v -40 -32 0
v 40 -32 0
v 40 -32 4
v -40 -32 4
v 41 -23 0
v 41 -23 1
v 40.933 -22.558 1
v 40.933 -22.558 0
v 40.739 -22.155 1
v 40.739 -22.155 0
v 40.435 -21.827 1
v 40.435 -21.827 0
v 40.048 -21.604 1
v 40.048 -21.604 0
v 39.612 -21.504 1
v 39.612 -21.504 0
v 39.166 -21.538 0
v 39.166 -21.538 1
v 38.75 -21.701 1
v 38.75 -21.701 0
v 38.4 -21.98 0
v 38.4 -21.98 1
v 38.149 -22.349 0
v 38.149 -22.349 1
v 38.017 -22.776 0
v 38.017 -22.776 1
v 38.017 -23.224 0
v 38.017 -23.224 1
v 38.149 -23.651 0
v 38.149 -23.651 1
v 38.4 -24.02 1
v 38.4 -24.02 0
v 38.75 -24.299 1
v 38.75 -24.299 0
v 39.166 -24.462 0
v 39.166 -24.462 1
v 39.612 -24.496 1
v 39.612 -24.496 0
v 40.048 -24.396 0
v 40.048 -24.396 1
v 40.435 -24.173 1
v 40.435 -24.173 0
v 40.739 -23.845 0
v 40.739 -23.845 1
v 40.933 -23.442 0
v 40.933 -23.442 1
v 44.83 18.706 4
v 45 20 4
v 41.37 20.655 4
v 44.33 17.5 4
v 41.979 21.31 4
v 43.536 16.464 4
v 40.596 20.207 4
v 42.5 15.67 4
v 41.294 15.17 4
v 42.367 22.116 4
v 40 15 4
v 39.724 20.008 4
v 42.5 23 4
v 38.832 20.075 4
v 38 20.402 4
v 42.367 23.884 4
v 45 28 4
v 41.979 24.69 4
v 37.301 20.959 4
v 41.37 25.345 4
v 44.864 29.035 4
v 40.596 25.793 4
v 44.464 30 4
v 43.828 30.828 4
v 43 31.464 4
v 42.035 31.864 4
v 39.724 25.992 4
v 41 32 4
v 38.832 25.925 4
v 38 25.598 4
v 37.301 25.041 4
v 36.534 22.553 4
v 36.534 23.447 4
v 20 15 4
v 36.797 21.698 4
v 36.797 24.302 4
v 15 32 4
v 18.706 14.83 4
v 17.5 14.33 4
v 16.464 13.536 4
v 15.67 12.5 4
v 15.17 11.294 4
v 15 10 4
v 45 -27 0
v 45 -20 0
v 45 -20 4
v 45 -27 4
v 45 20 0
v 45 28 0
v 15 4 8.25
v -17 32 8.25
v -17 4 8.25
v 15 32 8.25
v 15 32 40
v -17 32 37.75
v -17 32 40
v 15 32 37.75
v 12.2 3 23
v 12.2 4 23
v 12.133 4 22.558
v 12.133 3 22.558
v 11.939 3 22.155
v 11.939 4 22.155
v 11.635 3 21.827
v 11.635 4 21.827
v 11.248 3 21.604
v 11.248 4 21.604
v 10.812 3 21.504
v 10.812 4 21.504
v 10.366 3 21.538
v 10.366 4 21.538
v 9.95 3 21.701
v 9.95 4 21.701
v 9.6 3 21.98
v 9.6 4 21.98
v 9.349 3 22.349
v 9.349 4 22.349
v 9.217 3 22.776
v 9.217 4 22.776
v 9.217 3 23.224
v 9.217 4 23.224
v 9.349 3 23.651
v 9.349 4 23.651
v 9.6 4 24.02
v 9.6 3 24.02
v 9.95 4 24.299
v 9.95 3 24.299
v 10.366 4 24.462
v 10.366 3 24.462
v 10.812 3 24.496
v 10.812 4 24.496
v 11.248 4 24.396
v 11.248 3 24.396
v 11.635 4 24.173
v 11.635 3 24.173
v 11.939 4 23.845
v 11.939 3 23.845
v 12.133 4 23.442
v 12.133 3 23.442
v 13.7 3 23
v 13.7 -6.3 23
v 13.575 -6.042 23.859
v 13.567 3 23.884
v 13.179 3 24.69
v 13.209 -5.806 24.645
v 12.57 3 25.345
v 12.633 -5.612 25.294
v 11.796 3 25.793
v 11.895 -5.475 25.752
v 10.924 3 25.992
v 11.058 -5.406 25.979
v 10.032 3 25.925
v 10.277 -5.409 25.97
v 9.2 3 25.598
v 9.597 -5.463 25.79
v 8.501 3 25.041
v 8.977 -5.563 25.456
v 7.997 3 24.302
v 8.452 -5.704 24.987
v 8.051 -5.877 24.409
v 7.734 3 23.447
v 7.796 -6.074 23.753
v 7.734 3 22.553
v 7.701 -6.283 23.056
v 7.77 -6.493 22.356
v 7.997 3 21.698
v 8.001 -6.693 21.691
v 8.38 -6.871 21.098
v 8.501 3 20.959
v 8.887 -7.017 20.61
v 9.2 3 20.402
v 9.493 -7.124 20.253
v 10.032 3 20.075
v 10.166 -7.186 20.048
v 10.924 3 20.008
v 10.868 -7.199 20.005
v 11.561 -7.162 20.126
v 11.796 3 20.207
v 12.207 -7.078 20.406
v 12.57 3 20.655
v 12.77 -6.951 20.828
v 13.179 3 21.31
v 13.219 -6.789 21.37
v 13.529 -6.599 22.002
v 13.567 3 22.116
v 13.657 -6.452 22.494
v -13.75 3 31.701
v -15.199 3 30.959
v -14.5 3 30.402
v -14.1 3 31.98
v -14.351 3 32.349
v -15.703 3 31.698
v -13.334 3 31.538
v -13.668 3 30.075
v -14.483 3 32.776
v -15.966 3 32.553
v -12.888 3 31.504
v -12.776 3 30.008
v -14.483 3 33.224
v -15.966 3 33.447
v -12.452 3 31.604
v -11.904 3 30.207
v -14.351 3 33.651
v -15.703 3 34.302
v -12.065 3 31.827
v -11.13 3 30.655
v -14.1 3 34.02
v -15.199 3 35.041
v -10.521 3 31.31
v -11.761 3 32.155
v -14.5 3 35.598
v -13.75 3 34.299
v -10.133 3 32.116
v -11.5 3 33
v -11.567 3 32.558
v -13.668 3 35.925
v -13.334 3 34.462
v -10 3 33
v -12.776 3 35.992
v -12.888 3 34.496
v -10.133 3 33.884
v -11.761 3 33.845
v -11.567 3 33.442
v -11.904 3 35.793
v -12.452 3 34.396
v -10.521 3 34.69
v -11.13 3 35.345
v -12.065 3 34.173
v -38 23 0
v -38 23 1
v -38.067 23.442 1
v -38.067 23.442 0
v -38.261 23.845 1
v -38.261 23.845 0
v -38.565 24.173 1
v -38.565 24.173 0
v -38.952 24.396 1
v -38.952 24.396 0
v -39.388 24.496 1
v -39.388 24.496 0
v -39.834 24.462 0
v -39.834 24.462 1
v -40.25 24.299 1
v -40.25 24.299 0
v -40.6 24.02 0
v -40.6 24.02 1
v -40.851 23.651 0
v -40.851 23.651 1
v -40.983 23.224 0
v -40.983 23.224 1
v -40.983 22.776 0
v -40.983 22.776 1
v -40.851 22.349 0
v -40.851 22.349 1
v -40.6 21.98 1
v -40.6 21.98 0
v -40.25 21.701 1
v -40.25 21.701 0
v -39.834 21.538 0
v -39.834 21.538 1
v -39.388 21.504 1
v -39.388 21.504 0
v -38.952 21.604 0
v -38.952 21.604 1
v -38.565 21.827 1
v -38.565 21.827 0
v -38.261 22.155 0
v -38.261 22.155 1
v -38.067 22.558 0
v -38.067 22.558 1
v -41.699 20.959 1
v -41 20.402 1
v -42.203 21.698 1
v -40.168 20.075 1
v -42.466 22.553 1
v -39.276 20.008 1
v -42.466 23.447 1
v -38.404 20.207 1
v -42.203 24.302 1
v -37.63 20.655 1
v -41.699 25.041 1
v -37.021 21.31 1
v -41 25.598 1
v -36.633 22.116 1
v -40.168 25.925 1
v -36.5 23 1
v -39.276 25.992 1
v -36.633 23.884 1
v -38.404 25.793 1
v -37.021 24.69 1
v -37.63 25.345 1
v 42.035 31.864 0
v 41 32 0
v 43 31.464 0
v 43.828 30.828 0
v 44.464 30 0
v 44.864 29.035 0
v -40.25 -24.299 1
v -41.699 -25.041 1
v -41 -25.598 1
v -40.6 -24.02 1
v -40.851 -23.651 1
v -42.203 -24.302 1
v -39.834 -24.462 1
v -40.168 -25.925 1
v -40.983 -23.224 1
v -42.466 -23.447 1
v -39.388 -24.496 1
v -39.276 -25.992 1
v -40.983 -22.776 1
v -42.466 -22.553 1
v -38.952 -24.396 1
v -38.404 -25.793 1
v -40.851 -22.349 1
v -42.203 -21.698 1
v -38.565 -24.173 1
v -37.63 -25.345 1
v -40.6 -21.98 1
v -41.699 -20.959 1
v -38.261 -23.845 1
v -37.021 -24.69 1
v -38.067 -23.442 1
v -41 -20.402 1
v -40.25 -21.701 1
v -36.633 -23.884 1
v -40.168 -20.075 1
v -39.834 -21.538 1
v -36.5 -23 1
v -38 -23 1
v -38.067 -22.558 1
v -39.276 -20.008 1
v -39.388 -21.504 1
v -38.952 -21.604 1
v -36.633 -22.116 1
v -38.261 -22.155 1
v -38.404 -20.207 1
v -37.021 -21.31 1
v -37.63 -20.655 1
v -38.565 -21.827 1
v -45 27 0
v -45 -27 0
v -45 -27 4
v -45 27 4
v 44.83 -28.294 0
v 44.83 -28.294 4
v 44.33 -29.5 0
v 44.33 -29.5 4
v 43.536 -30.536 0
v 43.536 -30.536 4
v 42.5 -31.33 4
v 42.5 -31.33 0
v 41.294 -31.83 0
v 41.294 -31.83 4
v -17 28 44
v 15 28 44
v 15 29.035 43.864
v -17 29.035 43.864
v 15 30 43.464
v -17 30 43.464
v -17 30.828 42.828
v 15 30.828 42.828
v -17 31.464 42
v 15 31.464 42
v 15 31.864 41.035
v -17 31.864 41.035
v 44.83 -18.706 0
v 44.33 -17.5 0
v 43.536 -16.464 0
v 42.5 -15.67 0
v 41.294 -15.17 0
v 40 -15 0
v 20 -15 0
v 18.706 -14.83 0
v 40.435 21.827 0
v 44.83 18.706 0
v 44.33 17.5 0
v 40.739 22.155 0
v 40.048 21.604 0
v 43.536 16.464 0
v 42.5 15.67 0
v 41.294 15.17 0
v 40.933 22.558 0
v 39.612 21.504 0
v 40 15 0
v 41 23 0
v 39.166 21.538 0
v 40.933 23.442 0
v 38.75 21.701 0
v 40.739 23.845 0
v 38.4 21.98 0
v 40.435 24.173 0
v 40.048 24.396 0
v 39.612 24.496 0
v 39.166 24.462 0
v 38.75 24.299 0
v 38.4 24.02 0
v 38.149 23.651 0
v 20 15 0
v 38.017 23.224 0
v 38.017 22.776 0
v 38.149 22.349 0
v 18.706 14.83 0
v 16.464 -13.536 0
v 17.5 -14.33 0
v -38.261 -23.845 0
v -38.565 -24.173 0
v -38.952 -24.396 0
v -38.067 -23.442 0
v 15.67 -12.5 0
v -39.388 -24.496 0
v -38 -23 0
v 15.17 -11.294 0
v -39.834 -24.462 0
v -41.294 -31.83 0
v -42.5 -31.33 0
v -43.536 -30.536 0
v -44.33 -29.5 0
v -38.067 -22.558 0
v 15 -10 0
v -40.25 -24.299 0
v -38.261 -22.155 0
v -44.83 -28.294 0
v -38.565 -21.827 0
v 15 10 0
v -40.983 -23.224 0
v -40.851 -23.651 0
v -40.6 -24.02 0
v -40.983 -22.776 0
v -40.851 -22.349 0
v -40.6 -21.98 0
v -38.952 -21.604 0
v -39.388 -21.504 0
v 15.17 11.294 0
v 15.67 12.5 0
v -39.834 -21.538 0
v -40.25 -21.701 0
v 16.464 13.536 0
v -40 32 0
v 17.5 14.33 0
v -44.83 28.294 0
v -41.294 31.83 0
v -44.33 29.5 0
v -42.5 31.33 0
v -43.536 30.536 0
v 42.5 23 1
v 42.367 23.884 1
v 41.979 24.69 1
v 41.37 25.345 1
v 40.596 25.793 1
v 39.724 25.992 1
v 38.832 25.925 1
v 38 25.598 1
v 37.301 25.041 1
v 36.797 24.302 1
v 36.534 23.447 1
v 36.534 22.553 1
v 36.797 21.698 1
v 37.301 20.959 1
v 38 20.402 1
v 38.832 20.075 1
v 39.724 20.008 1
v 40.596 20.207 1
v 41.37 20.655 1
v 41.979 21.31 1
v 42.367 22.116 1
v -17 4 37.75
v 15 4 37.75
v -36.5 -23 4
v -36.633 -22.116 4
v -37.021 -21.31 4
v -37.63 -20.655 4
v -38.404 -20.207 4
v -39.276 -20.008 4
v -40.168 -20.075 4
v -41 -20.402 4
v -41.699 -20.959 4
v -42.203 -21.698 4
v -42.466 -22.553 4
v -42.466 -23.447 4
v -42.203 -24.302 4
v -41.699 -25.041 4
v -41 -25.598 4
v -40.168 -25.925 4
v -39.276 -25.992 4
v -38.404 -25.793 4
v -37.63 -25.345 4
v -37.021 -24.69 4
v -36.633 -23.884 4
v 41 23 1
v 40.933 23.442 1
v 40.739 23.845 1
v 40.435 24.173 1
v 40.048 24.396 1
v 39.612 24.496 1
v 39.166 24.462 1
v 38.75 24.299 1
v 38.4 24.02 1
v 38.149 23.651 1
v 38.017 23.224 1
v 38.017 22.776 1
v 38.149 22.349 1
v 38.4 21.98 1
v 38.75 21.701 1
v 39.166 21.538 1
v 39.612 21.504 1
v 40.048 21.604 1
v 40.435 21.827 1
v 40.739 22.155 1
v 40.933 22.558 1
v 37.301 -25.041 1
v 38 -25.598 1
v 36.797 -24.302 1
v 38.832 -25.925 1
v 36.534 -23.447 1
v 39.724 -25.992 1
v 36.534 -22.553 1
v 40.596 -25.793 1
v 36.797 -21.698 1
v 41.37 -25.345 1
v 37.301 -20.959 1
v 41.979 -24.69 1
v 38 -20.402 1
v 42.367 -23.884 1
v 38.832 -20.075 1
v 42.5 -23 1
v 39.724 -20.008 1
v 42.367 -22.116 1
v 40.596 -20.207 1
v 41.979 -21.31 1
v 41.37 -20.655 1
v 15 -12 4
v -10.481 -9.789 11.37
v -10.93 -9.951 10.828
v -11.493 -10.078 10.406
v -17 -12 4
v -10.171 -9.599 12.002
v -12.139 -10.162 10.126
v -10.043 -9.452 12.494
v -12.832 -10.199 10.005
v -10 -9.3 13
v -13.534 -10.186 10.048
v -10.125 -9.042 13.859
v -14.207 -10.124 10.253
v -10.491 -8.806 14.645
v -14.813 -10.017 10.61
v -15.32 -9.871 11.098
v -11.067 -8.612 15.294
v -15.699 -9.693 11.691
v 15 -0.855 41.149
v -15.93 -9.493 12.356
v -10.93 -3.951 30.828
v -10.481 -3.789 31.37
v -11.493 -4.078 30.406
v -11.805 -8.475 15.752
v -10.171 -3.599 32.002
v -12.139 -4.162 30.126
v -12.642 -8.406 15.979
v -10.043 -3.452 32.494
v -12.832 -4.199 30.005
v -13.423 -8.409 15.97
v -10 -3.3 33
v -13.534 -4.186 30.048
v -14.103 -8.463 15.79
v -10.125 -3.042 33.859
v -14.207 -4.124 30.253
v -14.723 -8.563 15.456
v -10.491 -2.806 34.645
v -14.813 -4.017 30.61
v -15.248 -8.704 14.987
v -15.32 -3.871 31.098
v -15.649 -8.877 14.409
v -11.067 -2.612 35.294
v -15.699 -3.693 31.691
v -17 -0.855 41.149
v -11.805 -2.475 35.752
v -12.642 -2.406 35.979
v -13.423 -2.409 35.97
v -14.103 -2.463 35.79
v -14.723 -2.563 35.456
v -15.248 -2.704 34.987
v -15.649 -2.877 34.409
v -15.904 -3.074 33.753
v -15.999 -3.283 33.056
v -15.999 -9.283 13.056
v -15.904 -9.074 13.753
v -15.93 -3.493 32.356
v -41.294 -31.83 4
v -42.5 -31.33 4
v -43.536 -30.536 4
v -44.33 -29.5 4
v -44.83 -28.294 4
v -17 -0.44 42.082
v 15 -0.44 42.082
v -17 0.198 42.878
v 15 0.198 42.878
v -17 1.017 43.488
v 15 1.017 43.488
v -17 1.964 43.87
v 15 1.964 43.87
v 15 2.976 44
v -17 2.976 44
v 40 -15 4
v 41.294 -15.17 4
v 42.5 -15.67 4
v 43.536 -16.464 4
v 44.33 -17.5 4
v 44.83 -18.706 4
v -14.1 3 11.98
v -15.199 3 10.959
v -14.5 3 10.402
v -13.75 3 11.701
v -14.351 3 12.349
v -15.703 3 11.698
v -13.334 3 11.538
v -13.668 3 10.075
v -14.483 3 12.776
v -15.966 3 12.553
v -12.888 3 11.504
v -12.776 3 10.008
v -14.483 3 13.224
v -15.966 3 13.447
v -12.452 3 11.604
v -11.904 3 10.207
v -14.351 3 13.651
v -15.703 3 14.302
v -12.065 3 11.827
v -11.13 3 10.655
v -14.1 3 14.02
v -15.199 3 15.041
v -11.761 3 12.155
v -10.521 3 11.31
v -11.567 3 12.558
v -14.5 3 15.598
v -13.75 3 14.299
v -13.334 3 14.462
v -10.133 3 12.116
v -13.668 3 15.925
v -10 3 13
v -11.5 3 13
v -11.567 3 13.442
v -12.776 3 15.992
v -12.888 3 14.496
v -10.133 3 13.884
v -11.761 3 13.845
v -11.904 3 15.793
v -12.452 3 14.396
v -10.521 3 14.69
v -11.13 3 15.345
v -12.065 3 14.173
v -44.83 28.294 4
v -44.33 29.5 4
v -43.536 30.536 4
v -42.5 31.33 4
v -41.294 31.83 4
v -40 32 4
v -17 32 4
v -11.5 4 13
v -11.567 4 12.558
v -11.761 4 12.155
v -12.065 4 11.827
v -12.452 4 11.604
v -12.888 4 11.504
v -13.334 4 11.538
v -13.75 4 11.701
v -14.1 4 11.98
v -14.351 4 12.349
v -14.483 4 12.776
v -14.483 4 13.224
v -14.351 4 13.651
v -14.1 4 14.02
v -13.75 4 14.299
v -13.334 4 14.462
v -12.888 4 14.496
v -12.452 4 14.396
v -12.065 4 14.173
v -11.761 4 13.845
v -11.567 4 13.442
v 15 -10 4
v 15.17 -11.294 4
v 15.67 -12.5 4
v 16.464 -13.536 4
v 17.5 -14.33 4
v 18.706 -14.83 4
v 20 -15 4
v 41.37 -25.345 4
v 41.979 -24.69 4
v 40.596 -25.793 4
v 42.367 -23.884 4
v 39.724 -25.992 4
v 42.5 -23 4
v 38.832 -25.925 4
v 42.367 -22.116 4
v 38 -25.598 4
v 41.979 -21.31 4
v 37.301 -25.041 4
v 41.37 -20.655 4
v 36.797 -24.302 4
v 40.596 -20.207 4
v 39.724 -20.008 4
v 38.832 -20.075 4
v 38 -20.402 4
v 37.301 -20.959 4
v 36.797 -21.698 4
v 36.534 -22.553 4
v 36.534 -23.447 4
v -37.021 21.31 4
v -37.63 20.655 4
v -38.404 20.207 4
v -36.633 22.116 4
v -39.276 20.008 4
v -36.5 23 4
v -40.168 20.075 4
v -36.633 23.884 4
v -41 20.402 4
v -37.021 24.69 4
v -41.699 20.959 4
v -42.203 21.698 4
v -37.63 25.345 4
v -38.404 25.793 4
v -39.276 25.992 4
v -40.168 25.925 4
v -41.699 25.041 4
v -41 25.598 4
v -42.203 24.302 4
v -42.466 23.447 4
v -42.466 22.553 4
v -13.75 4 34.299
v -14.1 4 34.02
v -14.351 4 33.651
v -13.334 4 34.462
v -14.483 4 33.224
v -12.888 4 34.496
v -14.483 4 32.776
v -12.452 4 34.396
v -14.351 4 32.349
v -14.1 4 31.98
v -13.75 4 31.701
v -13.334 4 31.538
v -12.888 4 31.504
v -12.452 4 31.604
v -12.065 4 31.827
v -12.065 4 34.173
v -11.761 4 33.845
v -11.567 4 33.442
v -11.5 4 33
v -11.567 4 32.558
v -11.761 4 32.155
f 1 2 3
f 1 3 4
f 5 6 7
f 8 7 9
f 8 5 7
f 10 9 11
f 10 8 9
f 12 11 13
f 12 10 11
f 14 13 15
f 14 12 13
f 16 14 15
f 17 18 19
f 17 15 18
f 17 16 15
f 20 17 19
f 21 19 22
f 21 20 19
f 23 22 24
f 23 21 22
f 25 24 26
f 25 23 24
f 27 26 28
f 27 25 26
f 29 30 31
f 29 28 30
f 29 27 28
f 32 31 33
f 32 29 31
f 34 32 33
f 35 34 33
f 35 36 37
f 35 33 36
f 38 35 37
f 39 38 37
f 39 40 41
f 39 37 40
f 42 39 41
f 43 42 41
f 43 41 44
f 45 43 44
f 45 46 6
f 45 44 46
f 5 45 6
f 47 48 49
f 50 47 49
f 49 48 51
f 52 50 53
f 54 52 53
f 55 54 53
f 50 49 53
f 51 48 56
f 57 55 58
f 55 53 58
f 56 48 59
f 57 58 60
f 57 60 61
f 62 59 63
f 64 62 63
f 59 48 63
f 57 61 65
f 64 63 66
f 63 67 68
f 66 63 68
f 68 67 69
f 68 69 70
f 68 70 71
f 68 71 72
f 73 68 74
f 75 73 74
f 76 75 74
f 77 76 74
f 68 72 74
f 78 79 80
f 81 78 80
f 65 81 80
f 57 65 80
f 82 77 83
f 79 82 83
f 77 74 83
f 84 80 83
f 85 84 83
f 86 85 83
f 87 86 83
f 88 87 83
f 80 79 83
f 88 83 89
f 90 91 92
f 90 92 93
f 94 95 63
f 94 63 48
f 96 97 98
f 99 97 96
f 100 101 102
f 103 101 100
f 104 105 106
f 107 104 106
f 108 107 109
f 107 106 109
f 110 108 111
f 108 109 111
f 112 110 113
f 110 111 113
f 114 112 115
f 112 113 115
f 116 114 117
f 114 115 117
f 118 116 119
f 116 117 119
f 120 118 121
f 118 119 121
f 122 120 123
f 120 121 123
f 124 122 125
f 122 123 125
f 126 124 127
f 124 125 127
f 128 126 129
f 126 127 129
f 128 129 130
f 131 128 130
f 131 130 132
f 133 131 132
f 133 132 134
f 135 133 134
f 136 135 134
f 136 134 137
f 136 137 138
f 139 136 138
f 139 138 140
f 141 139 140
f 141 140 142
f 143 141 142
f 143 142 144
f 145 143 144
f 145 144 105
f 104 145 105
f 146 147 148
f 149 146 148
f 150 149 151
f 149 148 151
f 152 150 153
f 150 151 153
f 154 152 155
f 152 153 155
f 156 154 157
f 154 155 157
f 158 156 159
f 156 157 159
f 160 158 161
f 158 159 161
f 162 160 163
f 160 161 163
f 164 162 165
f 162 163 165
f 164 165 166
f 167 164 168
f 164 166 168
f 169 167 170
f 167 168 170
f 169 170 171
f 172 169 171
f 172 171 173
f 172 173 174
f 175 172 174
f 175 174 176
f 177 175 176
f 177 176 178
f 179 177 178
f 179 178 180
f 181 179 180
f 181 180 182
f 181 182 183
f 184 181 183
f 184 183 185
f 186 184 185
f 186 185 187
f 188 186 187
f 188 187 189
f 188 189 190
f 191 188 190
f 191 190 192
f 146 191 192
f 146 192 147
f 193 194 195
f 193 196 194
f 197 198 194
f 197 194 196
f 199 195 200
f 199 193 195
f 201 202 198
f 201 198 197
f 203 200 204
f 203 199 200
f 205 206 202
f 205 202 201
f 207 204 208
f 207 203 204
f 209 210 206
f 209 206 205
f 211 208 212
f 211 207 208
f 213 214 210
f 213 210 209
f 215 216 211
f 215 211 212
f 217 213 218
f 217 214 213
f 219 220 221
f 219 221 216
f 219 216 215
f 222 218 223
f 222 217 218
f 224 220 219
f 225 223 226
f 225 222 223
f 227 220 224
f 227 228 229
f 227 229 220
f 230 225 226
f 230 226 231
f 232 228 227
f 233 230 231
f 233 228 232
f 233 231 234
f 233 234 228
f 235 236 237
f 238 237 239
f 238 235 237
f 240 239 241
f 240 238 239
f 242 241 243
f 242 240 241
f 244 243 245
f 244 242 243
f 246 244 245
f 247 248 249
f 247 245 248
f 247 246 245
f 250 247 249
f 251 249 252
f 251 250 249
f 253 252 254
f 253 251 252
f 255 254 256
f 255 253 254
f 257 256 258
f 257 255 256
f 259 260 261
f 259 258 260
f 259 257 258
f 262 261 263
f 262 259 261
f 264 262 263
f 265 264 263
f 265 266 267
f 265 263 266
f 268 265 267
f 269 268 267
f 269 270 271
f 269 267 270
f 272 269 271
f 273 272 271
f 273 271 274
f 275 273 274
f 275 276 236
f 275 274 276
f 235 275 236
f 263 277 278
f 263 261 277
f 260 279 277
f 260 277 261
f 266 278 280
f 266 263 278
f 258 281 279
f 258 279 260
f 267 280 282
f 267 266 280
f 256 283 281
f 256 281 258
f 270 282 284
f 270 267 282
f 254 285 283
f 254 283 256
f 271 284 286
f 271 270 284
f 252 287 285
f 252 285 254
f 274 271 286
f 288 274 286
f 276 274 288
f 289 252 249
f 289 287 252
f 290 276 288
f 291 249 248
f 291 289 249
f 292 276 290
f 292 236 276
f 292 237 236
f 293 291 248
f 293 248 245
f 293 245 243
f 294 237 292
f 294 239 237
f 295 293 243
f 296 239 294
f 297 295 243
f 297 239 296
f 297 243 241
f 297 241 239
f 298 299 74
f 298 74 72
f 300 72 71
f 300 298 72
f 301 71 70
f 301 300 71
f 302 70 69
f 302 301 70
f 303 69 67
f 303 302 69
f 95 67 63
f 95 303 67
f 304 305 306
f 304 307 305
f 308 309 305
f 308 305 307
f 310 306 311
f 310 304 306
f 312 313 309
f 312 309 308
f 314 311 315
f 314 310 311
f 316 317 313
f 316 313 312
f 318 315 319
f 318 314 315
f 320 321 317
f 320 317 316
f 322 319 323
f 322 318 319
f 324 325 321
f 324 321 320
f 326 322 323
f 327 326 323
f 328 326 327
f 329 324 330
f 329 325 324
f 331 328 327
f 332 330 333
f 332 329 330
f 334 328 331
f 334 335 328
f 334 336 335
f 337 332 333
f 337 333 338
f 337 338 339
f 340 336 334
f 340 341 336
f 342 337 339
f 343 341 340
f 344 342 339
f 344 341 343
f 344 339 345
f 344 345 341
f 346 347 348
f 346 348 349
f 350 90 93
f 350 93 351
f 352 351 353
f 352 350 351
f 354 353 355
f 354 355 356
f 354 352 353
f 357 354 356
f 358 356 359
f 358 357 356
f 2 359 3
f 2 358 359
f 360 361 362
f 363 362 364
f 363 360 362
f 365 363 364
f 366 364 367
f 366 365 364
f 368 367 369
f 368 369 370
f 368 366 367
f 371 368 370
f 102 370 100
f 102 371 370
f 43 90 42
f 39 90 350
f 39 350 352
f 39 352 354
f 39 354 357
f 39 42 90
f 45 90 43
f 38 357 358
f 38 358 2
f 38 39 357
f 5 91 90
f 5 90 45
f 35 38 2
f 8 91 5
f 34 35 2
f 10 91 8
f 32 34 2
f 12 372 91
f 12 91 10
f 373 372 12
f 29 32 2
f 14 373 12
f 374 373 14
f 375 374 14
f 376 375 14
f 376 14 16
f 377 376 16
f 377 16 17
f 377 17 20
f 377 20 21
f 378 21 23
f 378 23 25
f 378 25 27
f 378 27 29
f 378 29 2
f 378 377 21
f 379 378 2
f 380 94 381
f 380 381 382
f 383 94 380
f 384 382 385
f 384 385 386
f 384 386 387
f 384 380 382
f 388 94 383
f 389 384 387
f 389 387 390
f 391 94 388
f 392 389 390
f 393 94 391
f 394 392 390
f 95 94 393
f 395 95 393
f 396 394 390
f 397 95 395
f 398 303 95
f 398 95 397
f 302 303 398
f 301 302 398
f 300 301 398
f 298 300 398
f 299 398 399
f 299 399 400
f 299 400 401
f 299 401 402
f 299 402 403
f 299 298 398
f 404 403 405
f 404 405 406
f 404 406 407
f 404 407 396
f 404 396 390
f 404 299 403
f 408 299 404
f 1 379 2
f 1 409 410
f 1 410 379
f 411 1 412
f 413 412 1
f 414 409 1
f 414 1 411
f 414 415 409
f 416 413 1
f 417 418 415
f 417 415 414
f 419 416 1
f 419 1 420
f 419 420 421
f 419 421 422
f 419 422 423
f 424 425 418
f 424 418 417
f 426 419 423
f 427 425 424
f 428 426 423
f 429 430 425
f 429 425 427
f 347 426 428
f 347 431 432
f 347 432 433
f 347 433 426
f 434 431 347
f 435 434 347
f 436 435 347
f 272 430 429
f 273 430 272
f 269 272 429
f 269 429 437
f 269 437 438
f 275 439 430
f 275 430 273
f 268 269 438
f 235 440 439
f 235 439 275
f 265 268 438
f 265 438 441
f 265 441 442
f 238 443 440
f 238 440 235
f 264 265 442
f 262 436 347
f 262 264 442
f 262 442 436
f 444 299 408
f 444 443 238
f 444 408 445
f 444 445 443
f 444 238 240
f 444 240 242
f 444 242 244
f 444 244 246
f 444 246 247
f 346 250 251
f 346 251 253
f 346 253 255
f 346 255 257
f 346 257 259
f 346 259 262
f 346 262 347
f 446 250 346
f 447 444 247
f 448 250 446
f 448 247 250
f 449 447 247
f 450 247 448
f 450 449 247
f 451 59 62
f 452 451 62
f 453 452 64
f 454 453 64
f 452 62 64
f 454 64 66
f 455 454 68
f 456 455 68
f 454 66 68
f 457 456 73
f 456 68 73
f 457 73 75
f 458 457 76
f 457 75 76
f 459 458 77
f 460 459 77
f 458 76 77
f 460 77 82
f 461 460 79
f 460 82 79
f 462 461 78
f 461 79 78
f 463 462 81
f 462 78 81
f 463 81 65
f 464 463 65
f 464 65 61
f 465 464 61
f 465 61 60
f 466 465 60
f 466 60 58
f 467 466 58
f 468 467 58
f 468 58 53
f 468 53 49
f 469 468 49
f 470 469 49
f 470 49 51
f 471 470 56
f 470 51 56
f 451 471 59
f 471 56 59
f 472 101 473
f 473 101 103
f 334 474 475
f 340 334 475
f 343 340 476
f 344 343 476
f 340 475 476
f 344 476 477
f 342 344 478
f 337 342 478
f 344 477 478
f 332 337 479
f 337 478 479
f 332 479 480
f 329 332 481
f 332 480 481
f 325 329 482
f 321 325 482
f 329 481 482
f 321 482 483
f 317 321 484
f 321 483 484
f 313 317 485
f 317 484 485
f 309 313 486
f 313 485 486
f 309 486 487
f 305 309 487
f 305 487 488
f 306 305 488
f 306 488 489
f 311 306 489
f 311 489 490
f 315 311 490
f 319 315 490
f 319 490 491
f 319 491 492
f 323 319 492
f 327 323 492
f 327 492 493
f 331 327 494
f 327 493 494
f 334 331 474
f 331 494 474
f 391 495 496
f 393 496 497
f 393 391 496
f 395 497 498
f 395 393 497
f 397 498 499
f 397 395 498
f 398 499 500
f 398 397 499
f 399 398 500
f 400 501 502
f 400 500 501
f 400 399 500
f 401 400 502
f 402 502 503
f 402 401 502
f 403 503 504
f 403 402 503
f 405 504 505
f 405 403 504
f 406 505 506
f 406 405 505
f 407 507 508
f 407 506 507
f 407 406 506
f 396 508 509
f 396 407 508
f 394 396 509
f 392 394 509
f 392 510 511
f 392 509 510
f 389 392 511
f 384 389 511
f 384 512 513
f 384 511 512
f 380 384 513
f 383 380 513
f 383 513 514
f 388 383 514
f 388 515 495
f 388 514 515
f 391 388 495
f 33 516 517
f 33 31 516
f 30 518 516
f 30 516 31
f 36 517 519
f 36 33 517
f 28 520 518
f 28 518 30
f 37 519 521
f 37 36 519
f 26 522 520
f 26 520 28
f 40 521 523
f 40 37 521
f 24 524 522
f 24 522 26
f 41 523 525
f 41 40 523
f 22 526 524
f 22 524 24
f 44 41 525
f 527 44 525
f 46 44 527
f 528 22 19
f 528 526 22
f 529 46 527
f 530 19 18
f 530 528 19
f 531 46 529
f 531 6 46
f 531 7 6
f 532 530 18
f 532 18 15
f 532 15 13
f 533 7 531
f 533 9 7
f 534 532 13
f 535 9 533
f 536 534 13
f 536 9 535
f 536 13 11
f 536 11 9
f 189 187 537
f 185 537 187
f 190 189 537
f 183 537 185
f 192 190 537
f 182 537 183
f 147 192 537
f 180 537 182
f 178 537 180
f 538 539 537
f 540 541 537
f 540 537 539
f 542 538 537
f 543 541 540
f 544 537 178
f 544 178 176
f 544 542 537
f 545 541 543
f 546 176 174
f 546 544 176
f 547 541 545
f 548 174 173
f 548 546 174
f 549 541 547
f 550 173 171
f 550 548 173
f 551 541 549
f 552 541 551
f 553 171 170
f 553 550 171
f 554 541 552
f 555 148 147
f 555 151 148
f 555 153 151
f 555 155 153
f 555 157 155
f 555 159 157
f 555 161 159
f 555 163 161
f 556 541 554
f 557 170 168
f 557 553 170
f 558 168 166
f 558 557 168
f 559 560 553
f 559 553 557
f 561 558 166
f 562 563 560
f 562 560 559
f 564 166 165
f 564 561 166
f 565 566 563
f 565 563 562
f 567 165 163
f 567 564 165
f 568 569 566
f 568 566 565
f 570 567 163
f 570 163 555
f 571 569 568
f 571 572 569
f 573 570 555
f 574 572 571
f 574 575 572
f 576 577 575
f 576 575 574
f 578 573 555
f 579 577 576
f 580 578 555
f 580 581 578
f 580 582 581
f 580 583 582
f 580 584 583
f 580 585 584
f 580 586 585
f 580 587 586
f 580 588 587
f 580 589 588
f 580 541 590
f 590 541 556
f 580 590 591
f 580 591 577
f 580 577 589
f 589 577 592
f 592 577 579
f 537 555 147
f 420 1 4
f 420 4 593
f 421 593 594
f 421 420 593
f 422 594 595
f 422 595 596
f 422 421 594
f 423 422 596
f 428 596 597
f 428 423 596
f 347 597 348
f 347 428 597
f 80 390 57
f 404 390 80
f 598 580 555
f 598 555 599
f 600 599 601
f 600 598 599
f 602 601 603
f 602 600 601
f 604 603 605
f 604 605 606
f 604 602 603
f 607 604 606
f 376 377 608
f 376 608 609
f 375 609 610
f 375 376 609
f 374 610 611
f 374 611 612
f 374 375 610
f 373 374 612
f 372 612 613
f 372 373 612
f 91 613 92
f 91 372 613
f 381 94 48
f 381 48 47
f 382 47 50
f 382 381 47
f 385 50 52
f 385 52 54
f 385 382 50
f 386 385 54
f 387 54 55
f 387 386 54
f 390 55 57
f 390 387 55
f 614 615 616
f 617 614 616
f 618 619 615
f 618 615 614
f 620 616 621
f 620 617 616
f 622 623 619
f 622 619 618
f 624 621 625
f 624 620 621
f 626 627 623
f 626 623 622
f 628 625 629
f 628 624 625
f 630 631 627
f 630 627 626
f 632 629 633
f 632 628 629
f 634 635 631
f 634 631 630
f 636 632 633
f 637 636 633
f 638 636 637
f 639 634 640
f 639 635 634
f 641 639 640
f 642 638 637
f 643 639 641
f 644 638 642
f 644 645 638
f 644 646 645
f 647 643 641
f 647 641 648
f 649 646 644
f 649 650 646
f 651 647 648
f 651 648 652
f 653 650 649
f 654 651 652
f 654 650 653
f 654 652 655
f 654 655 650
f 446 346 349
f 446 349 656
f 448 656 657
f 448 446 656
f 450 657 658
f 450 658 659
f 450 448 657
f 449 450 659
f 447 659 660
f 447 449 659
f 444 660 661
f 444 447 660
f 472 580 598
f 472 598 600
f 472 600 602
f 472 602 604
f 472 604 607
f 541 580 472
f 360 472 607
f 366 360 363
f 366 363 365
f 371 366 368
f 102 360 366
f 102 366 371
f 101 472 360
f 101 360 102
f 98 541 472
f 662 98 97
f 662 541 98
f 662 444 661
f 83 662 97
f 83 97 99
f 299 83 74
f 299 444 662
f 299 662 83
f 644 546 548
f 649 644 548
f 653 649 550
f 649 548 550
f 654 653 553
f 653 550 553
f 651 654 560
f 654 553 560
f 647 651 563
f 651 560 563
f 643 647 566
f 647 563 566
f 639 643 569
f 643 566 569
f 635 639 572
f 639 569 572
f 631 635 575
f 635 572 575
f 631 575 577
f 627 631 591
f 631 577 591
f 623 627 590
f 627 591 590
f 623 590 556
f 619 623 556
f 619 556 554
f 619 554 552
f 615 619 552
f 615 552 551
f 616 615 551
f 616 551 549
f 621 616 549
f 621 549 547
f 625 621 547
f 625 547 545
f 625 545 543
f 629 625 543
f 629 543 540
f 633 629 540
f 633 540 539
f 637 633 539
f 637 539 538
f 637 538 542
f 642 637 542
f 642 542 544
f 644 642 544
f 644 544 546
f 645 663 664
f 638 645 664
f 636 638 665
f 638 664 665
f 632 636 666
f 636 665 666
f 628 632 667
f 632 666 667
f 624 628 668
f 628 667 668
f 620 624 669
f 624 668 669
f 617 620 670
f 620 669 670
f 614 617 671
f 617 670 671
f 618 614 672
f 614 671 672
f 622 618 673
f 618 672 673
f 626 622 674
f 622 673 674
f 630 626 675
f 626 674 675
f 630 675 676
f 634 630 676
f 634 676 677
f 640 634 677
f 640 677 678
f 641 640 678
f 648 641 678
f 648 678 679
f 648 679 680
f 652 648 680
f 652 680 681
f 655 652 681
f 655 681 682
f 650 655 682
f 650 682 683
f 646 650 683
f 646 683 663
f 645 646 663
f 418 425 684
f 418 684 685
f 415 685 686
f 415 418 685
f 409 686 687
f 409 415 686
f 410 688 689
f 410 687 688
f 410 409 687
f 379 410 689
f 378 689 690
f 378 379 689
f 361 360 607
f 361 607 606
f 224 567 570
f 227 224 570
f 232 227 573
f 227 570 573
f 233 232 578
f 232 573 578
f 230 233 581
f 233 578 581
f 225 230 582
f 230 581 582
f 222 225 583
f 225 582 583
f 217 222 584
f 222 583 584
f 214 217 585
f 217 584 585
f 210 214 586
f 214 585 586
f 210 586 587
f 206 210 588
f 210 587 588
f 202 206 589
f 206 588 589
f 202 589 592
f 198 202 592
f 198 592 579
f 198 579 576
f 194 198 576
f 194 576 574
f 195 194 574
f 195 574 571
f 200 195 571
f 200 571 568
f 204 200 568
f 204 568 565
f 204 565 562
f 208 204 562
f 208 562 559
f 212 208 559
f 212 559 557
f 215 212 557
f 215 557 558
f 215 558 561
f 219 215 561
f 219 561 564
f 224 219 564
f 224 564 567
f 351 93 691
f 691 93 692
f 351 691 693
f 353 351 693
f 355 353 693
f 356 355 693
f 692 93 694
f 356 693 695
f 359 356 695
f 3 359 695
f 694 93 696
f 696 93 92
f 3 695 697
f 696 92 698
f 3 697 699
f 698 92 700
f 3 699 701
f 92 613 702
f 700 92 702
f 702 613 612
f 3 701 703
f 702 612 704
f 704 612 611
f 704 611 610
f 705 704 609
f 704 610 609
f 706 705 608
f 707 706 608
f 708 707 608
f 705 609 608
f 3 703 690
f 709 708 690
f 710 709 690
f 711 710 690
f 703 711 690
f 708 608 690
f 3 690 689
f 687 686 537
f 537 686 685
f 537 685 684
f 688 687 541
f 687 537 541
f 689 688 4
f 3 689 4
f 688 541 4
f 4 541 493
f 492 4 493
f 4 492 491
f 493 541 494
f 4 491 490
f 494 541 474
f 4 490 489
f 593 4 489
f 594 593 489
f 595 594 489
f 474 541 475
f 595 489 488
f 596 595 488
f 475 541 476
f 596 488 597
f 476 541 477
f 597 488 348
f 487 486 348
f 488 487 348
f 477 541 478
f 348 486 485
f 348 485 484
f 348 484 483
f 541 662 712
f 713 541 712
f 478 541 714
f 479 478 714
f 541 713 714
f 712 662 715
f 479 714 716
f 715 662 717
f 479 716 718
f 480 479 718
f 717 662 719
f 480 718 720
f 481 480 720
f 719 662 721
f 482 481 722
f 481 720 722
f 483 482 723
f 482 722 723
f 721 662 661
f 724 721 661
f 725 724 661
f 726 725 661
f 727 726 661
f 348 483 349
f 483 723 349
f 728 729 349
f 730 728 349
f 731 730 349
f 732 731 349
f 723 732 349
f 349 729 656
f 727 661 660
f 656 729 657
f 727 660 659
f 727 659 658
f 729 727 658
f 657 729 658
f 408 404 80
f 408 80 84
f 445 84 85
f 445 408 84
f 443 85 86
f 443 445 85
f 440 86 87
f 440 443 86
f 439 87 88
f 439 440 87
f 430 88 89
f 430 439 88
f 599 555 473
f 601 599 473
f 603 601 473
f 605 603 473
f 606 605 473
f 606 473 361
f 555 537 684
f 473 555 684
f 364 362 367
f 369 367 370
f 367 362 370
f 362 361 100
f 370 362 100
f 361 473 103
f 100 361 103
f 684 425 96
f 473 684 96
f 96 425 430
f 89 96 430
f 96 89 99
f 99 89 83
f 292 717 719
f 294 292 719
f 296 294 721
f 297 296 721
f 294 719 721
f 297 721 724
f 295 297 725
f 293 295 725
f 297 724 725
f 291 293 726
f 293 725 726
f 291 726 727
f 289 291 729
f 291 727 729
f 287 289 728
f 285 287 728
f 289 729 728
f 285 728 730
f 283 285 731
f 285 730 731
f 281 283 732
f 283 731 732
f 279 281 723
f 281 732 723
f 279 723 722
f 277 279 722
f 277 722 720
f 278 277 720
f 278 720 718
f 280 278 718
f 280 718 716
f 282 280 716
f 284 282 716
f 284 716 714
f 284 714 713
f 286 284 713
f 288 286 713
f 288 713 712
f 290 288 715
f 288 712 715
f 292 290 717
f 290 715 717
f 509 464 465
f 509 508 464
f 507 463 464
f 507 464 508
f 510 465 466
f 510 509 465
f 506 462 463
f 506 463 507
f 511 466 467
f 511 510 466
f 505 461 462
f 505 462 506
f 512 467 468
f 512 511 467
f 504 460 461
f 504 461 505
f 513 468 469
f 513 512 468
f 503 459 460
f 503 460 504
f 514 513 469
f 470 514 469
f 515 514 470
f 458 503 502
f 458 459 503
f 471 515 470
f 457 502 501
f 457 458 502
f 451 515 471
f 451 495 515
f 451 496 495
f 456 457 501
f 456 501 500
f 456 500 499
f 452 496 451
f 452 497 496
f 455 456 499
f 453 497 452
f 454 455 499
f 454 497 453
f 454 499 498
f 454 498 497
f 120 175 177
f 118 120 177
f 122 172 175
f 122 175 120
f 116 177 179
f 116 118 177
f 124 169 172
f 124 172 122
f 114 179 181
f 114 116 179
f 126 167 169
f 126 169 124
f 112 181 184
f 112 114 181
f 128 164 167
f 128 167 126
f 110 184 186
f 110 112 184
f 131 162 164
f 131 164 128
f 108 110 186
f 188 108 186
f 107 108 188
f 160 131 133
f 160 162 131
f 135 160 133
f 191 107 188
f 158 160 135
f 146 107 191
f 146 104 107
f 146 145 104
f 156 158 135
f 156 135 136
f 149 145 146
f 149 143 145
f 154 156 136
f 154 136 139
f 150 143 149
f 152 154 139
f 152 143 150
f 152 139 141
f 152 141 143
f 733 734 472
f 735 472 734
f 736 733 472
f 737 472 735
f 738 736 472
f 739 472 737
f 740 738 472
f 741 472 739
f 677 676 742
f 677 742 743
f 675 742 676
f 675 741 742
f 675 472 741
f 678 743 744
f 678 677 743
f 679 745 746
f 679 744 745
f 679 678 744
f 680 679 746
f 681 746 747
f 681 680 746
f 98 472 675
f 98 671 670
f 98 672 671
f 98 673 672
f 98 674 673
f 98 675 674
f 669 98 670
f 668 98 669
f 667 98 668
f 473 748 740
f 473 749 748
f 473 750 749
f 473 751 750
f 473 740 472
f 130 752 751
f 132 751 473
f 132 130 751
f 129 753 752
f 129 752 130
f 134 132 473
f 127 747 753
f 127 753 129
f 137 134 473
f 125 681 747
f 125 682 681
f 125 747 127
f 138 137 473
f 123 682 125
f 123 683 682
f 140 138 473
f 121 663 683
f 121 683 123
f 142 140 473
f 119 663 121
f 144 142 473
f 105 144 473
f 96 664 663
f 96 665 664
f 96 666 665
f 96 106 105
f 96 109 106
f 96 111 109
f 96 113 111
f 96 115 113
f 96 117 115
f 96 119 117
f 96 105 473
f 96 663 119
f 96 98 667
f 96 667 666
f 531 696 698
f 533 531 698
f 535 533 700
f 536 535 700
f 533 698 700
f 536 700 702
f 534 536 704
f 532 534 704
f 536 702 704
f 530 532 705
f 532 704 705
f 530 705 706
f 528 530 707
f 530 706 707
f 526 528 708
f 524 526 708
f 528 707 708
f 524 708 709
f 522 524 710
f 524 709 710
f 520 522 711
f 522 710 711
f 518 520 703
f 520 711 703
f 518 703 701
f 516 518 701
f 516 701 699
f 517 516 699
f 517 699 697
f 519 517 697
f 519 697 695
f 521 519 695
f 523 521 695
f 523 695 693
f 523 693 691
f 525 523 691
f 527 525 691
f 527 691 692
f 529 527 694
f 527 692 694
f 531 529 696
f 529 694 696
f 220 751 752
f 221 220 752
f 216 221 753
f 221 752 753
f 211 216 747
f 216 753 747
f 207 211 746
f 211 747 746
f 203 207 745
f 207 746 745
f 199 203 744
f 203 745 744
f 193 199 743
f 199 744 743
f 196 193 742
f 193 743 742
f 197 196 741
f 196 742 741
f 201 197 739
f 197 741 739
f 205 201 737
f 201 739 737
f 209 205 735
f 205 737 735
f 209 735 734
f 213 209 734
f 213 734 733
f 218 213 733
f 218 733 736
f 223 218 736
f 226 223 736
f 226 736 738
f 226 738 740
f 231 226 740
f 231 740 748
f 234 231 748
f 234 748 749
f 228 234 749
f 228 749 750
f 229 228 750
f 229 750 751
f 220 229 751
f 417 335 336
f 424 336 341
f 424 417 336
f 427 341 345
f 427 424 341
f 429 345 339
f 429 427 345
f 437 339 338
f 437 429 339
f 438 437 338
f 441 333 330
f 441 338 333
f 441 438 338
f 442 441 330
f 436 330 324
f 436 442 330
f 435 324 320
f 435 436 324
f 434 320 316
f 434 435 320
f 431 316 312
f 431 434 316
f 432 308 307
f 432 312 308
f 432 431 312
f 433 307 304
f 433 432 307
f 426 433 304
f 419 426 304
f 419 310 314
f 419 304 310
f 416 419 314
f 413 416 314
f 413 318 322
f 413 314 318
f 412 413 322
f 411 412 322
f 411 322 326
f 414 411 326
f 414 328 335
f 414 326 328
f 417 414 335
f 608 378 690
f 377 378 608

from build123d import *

# Parameters (mm, degrees)
SKETCH_1_R           = 1.5
EXTRUDE_1_DEPTH      = 4
SKETCH_2_R           = 3
CUT_EXTRUDE_1_DEPTH  = 3
SKETCH_3_W           = 32
SKETCH_3_H           = 44
EXTRUDE_2_DEPTH      = 40
SKETCH_4_R           = 1.5
CUT_EXTRUDE_2_DEPTH  = 65
SKETCH_5_R           = 3
CUT_EXTRUDE_10_DEPTH = 15
SKETCH_7_W           = 32
SKETCH_7_H           = 29.5
CUT_EXTRUDE_12_DEPTH = 28
CUT_EXTRUDE_11_DEPTH = 63


with BuildPart() as part:
    # 草图1 → 凸台-拉伸1 (new body)
    with BuildSketch(Plane.XY):
        with BuildLine():
            Line((-40, 32), (41, 32))
            ThreePointArc((41, 32), (43.828427125, 30.828427125), (45, 28))
            Line((45, 28), (45, 20))
            ThreePointArc((45, 20), (43.535533906, 16.464466094), (40, 15))
            Line((40, 15), (20, 15))
            ThreePointArc((20, 15), (16.464466094, 13.535533906), (15, 10))
            Line((15, 10), (15, -10))
            ThreePointArc((15, -10), (16.464466094, -13.535533906), (20, -15))
            Line((20, -15), (40, -15))
            ThreePointArc((40, -15), (43.535533906, -16.464466094), (45, -20))
            Line((45, -20), (45, -27))
            ThreePointArc((45, -27), (43.535533906, -30.535533906), (40, -32))
            Line((40, -32), (-40, -32))
            ThreePointArc((-40, -32), (-43.535533906, -30.535533906), (-45, -27))
            Line((-45, -27), (-45, 27))
            ThreePointArc((-45, 27), (-43.535533906, 30.535533906), (-40, 32))
        make_face()
        with Locations((-39.5, 23)):
            Circle(SKETCH_1_R, mode=Mode.SUBTRACT)
        with Locations((-39.5, -23)):
            Circle(SKETCH_1_R, mode=Mode.SUBTRACT)
        with Locations((39.5, -23)):
            Circle(SKETCH_1_R, mode=Mode.SUBTRACT)
        with Locations((39.5, 23)):
            Circle(SKETCH_1_R, mode=Mode.SUBTRACT)
    extrude(amount=EXTRUDE_1_DEPTH)

    # 草图2 → 切除-拉伸1 (cut)
    with BuildSketch(Plane.XY.offset(4)):
        with Locations((-39.5, 23)):
            Circle(SKETCH_2_R)
        with Locations((-39.5, -23)):
            Circle(SKETCH_2_R)
        with Locations((39.5, -23)):
            Circle(SKETCH_2_R)
        with Locations((39.5, 23)):
            Circle(SKETCH_2_R)
    extrude(amount=-CUT_EXTRUDE_1_DEPTH, mode=Mode.SUBTRACT)

    # 草图3 → 凸台-拉伸2 (add)
    with BuildSketch(Plane.XY.offset(4)):
        with Locations((-1, 10)):
            Rectangle(SKETCH_3_W, SKETCH_3_H)
    extrude(amount=EXTRUDE_2_DEPTH)

    # 草图4 → 切除-拉伸2 (cut, through all)
    with BuildSketch(Plane(origin=(0, 32, 0), x_dir=(1, 0, 0), z_dir=(0, 1, 0))):
        with Locations((-13, -13)):
            Circle(SKETCH_4_R)
        with Locations((-13, -33)):
            Circle(SKETCH_4_R)
        with Locations((10.7, -23)):
            Circle(SKETCH_4_R)
    extrude(amount=-CUT_EXTRUDE_2_DEPTH, mode=Mode.SUBTRACT)

    # 草图5 → 切除-拉伸10 (cut)
    with BuildSketch(Plane.XZ.offset(12)):
        with Locations((-13, 33)):
            Circle(SKETCH_5_R)
        with Locations((-13, 13)):
            Circle(SKETCH_5_R)
        with Locations((10.7, 23)):
            Circle(SKETCH_5_R)
    extrude(amount=-CUT_EXTRUDE_10_DEPTH, mode=Mode.SUBTRACT)

    # 草图7 → 切除-拉伸12 (cut)
    with BuildSketch(Plane(origin=(0, 32, 0), x_dir=(1, 0, 0), z_dir=(0, 1, 0))):
        with Locations((-1, -23)):
            Rectangle(SKETCH_7_W, SKETCH_7_H)
    extrude(amount=-CUT_EXTRUDE_12_DEPTH, mode=Mode.SUBTRACT)

    # 草图6 → 切除-拉伸11 (cut, through all)
    with BuildSketch(Plane.ZY.offset(17)):
        with BuildLine():
            Line((4, -12), (41.149391542, -0.855182537))
            ThreePointArc((41.149391542, -0.855182537), (43.209171713, 0.588400485), (44, 2.976122604))
            Line((44, 2.976122604), (44, -12))
            Line((44, -12), (4, -12))
        make_face()
        with BuildLine():
            Line((40, 32), (44, 32))
            Line((44, 32), (44, 28))
            ThreePointArc((44, 28), (42.828427125, 30.828427125), (40, 32))
        make_face()
    extrude(amount=-CUT_EXTRUDE_11_DEPTH, mode=Mode.SUBTRACT)


solid = part.part
